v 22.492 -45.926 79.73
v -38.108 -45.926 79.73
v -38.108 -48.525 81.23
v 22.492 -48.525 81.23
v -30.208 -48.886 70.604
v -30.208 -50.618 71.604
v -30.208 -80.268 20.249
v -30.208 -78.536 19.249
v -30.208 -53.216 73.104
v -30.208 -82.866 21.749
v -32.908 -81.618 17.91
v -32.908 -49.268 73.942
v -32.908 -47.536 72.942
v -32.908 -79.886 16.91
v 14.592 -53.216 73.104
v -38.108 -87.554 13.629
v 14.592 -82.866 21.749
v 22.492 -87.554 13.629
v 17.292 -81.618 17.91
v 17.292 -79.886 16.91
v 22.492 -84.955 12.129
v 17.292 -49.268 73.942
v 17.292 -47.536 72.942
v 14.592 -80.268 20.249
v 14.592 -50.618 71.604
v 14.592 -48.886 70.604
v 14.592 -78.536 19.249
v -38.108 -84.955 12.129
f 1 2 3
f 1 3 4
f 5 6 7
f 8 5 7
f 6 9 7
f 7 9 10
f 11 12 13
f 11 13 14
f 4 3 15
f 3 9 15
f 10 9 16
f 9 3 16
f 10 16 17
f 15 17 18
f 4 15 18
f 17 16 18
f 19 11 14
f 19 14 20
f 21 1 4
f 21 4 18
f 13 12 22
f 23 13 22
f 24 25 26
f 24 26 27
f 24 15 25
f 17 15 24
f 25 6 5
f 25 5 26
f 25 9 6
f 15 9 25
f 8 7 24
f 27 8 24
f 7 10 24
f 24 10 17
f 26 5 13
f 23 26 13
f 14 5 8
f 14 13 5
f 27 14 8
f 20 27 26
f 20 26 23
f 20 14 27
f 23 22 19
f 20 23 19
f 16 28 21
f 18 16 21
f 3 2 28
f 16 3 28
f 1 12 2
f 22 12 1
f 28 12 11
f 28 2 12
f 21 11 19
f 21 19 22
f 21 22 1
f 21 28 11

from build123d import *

# Parameters (mm, degrees)
SKETCH1_W           = 60.6
SKETCH1_H           = 78.05786816
SKETCH1_W_2         = 44.8
SKETCH1_H_2         = 59.3
BOSS_EXTRUDE1_DEPTH = 3
SKETCH2_W           = 50.200000001
SKETCH2_H           = 64.7
SKETCH2_W_2         = 44.8
SKETCH2_H_2         = 59.299999999
BOSS_EXTRUDE2_DEPTH = 2


with BuildPart() as part:
    # Sketch1 → Boss-Extrude1 (new body)
    with BuildSketch(Plane(origin=(-8e-09, -784.034696128, -1198.711383076), x_dir=(1, 0, 0), z_dir=(0, 0.8660254037844385, -0.5000000000000002))):
        with Locations((-7.807791054, -1437.18747743)):
            Rectangle(SKETCH1_W, SKETCH1_H)
        with Locations((-7.807791055, -1437.183756537)):
            Rectangle(SKETCH1_W_2, SKETCH1_H_2, mode=Mode.SUBTRACT)
    extrude(amount=-BOSS_EXTRUDE1_DEPTH)

    # Sketch2 → Boss-Extrude2 (add)
    with BuildSketch(Plane(origin=(0, -68.968767322, 39.819136379), x_dir=(1, 0, 0), z_dir=(0, 0.8660254037844385, -0.5000000000000002))):
        with Locations((-7.807791061, -7.051898924)):
            Rectangle(SKETCH2_W, SKETCH2_H)
        with Locations((-7.807791063, -7.051898923)):
            Rectangle(SKETCH2_W_2, SKETCH2_H_2, mode=Mode.SUBTRACT)
    extrude(amount=BOSS_EXTRUDE2_DEPTH)


solid = part.part
